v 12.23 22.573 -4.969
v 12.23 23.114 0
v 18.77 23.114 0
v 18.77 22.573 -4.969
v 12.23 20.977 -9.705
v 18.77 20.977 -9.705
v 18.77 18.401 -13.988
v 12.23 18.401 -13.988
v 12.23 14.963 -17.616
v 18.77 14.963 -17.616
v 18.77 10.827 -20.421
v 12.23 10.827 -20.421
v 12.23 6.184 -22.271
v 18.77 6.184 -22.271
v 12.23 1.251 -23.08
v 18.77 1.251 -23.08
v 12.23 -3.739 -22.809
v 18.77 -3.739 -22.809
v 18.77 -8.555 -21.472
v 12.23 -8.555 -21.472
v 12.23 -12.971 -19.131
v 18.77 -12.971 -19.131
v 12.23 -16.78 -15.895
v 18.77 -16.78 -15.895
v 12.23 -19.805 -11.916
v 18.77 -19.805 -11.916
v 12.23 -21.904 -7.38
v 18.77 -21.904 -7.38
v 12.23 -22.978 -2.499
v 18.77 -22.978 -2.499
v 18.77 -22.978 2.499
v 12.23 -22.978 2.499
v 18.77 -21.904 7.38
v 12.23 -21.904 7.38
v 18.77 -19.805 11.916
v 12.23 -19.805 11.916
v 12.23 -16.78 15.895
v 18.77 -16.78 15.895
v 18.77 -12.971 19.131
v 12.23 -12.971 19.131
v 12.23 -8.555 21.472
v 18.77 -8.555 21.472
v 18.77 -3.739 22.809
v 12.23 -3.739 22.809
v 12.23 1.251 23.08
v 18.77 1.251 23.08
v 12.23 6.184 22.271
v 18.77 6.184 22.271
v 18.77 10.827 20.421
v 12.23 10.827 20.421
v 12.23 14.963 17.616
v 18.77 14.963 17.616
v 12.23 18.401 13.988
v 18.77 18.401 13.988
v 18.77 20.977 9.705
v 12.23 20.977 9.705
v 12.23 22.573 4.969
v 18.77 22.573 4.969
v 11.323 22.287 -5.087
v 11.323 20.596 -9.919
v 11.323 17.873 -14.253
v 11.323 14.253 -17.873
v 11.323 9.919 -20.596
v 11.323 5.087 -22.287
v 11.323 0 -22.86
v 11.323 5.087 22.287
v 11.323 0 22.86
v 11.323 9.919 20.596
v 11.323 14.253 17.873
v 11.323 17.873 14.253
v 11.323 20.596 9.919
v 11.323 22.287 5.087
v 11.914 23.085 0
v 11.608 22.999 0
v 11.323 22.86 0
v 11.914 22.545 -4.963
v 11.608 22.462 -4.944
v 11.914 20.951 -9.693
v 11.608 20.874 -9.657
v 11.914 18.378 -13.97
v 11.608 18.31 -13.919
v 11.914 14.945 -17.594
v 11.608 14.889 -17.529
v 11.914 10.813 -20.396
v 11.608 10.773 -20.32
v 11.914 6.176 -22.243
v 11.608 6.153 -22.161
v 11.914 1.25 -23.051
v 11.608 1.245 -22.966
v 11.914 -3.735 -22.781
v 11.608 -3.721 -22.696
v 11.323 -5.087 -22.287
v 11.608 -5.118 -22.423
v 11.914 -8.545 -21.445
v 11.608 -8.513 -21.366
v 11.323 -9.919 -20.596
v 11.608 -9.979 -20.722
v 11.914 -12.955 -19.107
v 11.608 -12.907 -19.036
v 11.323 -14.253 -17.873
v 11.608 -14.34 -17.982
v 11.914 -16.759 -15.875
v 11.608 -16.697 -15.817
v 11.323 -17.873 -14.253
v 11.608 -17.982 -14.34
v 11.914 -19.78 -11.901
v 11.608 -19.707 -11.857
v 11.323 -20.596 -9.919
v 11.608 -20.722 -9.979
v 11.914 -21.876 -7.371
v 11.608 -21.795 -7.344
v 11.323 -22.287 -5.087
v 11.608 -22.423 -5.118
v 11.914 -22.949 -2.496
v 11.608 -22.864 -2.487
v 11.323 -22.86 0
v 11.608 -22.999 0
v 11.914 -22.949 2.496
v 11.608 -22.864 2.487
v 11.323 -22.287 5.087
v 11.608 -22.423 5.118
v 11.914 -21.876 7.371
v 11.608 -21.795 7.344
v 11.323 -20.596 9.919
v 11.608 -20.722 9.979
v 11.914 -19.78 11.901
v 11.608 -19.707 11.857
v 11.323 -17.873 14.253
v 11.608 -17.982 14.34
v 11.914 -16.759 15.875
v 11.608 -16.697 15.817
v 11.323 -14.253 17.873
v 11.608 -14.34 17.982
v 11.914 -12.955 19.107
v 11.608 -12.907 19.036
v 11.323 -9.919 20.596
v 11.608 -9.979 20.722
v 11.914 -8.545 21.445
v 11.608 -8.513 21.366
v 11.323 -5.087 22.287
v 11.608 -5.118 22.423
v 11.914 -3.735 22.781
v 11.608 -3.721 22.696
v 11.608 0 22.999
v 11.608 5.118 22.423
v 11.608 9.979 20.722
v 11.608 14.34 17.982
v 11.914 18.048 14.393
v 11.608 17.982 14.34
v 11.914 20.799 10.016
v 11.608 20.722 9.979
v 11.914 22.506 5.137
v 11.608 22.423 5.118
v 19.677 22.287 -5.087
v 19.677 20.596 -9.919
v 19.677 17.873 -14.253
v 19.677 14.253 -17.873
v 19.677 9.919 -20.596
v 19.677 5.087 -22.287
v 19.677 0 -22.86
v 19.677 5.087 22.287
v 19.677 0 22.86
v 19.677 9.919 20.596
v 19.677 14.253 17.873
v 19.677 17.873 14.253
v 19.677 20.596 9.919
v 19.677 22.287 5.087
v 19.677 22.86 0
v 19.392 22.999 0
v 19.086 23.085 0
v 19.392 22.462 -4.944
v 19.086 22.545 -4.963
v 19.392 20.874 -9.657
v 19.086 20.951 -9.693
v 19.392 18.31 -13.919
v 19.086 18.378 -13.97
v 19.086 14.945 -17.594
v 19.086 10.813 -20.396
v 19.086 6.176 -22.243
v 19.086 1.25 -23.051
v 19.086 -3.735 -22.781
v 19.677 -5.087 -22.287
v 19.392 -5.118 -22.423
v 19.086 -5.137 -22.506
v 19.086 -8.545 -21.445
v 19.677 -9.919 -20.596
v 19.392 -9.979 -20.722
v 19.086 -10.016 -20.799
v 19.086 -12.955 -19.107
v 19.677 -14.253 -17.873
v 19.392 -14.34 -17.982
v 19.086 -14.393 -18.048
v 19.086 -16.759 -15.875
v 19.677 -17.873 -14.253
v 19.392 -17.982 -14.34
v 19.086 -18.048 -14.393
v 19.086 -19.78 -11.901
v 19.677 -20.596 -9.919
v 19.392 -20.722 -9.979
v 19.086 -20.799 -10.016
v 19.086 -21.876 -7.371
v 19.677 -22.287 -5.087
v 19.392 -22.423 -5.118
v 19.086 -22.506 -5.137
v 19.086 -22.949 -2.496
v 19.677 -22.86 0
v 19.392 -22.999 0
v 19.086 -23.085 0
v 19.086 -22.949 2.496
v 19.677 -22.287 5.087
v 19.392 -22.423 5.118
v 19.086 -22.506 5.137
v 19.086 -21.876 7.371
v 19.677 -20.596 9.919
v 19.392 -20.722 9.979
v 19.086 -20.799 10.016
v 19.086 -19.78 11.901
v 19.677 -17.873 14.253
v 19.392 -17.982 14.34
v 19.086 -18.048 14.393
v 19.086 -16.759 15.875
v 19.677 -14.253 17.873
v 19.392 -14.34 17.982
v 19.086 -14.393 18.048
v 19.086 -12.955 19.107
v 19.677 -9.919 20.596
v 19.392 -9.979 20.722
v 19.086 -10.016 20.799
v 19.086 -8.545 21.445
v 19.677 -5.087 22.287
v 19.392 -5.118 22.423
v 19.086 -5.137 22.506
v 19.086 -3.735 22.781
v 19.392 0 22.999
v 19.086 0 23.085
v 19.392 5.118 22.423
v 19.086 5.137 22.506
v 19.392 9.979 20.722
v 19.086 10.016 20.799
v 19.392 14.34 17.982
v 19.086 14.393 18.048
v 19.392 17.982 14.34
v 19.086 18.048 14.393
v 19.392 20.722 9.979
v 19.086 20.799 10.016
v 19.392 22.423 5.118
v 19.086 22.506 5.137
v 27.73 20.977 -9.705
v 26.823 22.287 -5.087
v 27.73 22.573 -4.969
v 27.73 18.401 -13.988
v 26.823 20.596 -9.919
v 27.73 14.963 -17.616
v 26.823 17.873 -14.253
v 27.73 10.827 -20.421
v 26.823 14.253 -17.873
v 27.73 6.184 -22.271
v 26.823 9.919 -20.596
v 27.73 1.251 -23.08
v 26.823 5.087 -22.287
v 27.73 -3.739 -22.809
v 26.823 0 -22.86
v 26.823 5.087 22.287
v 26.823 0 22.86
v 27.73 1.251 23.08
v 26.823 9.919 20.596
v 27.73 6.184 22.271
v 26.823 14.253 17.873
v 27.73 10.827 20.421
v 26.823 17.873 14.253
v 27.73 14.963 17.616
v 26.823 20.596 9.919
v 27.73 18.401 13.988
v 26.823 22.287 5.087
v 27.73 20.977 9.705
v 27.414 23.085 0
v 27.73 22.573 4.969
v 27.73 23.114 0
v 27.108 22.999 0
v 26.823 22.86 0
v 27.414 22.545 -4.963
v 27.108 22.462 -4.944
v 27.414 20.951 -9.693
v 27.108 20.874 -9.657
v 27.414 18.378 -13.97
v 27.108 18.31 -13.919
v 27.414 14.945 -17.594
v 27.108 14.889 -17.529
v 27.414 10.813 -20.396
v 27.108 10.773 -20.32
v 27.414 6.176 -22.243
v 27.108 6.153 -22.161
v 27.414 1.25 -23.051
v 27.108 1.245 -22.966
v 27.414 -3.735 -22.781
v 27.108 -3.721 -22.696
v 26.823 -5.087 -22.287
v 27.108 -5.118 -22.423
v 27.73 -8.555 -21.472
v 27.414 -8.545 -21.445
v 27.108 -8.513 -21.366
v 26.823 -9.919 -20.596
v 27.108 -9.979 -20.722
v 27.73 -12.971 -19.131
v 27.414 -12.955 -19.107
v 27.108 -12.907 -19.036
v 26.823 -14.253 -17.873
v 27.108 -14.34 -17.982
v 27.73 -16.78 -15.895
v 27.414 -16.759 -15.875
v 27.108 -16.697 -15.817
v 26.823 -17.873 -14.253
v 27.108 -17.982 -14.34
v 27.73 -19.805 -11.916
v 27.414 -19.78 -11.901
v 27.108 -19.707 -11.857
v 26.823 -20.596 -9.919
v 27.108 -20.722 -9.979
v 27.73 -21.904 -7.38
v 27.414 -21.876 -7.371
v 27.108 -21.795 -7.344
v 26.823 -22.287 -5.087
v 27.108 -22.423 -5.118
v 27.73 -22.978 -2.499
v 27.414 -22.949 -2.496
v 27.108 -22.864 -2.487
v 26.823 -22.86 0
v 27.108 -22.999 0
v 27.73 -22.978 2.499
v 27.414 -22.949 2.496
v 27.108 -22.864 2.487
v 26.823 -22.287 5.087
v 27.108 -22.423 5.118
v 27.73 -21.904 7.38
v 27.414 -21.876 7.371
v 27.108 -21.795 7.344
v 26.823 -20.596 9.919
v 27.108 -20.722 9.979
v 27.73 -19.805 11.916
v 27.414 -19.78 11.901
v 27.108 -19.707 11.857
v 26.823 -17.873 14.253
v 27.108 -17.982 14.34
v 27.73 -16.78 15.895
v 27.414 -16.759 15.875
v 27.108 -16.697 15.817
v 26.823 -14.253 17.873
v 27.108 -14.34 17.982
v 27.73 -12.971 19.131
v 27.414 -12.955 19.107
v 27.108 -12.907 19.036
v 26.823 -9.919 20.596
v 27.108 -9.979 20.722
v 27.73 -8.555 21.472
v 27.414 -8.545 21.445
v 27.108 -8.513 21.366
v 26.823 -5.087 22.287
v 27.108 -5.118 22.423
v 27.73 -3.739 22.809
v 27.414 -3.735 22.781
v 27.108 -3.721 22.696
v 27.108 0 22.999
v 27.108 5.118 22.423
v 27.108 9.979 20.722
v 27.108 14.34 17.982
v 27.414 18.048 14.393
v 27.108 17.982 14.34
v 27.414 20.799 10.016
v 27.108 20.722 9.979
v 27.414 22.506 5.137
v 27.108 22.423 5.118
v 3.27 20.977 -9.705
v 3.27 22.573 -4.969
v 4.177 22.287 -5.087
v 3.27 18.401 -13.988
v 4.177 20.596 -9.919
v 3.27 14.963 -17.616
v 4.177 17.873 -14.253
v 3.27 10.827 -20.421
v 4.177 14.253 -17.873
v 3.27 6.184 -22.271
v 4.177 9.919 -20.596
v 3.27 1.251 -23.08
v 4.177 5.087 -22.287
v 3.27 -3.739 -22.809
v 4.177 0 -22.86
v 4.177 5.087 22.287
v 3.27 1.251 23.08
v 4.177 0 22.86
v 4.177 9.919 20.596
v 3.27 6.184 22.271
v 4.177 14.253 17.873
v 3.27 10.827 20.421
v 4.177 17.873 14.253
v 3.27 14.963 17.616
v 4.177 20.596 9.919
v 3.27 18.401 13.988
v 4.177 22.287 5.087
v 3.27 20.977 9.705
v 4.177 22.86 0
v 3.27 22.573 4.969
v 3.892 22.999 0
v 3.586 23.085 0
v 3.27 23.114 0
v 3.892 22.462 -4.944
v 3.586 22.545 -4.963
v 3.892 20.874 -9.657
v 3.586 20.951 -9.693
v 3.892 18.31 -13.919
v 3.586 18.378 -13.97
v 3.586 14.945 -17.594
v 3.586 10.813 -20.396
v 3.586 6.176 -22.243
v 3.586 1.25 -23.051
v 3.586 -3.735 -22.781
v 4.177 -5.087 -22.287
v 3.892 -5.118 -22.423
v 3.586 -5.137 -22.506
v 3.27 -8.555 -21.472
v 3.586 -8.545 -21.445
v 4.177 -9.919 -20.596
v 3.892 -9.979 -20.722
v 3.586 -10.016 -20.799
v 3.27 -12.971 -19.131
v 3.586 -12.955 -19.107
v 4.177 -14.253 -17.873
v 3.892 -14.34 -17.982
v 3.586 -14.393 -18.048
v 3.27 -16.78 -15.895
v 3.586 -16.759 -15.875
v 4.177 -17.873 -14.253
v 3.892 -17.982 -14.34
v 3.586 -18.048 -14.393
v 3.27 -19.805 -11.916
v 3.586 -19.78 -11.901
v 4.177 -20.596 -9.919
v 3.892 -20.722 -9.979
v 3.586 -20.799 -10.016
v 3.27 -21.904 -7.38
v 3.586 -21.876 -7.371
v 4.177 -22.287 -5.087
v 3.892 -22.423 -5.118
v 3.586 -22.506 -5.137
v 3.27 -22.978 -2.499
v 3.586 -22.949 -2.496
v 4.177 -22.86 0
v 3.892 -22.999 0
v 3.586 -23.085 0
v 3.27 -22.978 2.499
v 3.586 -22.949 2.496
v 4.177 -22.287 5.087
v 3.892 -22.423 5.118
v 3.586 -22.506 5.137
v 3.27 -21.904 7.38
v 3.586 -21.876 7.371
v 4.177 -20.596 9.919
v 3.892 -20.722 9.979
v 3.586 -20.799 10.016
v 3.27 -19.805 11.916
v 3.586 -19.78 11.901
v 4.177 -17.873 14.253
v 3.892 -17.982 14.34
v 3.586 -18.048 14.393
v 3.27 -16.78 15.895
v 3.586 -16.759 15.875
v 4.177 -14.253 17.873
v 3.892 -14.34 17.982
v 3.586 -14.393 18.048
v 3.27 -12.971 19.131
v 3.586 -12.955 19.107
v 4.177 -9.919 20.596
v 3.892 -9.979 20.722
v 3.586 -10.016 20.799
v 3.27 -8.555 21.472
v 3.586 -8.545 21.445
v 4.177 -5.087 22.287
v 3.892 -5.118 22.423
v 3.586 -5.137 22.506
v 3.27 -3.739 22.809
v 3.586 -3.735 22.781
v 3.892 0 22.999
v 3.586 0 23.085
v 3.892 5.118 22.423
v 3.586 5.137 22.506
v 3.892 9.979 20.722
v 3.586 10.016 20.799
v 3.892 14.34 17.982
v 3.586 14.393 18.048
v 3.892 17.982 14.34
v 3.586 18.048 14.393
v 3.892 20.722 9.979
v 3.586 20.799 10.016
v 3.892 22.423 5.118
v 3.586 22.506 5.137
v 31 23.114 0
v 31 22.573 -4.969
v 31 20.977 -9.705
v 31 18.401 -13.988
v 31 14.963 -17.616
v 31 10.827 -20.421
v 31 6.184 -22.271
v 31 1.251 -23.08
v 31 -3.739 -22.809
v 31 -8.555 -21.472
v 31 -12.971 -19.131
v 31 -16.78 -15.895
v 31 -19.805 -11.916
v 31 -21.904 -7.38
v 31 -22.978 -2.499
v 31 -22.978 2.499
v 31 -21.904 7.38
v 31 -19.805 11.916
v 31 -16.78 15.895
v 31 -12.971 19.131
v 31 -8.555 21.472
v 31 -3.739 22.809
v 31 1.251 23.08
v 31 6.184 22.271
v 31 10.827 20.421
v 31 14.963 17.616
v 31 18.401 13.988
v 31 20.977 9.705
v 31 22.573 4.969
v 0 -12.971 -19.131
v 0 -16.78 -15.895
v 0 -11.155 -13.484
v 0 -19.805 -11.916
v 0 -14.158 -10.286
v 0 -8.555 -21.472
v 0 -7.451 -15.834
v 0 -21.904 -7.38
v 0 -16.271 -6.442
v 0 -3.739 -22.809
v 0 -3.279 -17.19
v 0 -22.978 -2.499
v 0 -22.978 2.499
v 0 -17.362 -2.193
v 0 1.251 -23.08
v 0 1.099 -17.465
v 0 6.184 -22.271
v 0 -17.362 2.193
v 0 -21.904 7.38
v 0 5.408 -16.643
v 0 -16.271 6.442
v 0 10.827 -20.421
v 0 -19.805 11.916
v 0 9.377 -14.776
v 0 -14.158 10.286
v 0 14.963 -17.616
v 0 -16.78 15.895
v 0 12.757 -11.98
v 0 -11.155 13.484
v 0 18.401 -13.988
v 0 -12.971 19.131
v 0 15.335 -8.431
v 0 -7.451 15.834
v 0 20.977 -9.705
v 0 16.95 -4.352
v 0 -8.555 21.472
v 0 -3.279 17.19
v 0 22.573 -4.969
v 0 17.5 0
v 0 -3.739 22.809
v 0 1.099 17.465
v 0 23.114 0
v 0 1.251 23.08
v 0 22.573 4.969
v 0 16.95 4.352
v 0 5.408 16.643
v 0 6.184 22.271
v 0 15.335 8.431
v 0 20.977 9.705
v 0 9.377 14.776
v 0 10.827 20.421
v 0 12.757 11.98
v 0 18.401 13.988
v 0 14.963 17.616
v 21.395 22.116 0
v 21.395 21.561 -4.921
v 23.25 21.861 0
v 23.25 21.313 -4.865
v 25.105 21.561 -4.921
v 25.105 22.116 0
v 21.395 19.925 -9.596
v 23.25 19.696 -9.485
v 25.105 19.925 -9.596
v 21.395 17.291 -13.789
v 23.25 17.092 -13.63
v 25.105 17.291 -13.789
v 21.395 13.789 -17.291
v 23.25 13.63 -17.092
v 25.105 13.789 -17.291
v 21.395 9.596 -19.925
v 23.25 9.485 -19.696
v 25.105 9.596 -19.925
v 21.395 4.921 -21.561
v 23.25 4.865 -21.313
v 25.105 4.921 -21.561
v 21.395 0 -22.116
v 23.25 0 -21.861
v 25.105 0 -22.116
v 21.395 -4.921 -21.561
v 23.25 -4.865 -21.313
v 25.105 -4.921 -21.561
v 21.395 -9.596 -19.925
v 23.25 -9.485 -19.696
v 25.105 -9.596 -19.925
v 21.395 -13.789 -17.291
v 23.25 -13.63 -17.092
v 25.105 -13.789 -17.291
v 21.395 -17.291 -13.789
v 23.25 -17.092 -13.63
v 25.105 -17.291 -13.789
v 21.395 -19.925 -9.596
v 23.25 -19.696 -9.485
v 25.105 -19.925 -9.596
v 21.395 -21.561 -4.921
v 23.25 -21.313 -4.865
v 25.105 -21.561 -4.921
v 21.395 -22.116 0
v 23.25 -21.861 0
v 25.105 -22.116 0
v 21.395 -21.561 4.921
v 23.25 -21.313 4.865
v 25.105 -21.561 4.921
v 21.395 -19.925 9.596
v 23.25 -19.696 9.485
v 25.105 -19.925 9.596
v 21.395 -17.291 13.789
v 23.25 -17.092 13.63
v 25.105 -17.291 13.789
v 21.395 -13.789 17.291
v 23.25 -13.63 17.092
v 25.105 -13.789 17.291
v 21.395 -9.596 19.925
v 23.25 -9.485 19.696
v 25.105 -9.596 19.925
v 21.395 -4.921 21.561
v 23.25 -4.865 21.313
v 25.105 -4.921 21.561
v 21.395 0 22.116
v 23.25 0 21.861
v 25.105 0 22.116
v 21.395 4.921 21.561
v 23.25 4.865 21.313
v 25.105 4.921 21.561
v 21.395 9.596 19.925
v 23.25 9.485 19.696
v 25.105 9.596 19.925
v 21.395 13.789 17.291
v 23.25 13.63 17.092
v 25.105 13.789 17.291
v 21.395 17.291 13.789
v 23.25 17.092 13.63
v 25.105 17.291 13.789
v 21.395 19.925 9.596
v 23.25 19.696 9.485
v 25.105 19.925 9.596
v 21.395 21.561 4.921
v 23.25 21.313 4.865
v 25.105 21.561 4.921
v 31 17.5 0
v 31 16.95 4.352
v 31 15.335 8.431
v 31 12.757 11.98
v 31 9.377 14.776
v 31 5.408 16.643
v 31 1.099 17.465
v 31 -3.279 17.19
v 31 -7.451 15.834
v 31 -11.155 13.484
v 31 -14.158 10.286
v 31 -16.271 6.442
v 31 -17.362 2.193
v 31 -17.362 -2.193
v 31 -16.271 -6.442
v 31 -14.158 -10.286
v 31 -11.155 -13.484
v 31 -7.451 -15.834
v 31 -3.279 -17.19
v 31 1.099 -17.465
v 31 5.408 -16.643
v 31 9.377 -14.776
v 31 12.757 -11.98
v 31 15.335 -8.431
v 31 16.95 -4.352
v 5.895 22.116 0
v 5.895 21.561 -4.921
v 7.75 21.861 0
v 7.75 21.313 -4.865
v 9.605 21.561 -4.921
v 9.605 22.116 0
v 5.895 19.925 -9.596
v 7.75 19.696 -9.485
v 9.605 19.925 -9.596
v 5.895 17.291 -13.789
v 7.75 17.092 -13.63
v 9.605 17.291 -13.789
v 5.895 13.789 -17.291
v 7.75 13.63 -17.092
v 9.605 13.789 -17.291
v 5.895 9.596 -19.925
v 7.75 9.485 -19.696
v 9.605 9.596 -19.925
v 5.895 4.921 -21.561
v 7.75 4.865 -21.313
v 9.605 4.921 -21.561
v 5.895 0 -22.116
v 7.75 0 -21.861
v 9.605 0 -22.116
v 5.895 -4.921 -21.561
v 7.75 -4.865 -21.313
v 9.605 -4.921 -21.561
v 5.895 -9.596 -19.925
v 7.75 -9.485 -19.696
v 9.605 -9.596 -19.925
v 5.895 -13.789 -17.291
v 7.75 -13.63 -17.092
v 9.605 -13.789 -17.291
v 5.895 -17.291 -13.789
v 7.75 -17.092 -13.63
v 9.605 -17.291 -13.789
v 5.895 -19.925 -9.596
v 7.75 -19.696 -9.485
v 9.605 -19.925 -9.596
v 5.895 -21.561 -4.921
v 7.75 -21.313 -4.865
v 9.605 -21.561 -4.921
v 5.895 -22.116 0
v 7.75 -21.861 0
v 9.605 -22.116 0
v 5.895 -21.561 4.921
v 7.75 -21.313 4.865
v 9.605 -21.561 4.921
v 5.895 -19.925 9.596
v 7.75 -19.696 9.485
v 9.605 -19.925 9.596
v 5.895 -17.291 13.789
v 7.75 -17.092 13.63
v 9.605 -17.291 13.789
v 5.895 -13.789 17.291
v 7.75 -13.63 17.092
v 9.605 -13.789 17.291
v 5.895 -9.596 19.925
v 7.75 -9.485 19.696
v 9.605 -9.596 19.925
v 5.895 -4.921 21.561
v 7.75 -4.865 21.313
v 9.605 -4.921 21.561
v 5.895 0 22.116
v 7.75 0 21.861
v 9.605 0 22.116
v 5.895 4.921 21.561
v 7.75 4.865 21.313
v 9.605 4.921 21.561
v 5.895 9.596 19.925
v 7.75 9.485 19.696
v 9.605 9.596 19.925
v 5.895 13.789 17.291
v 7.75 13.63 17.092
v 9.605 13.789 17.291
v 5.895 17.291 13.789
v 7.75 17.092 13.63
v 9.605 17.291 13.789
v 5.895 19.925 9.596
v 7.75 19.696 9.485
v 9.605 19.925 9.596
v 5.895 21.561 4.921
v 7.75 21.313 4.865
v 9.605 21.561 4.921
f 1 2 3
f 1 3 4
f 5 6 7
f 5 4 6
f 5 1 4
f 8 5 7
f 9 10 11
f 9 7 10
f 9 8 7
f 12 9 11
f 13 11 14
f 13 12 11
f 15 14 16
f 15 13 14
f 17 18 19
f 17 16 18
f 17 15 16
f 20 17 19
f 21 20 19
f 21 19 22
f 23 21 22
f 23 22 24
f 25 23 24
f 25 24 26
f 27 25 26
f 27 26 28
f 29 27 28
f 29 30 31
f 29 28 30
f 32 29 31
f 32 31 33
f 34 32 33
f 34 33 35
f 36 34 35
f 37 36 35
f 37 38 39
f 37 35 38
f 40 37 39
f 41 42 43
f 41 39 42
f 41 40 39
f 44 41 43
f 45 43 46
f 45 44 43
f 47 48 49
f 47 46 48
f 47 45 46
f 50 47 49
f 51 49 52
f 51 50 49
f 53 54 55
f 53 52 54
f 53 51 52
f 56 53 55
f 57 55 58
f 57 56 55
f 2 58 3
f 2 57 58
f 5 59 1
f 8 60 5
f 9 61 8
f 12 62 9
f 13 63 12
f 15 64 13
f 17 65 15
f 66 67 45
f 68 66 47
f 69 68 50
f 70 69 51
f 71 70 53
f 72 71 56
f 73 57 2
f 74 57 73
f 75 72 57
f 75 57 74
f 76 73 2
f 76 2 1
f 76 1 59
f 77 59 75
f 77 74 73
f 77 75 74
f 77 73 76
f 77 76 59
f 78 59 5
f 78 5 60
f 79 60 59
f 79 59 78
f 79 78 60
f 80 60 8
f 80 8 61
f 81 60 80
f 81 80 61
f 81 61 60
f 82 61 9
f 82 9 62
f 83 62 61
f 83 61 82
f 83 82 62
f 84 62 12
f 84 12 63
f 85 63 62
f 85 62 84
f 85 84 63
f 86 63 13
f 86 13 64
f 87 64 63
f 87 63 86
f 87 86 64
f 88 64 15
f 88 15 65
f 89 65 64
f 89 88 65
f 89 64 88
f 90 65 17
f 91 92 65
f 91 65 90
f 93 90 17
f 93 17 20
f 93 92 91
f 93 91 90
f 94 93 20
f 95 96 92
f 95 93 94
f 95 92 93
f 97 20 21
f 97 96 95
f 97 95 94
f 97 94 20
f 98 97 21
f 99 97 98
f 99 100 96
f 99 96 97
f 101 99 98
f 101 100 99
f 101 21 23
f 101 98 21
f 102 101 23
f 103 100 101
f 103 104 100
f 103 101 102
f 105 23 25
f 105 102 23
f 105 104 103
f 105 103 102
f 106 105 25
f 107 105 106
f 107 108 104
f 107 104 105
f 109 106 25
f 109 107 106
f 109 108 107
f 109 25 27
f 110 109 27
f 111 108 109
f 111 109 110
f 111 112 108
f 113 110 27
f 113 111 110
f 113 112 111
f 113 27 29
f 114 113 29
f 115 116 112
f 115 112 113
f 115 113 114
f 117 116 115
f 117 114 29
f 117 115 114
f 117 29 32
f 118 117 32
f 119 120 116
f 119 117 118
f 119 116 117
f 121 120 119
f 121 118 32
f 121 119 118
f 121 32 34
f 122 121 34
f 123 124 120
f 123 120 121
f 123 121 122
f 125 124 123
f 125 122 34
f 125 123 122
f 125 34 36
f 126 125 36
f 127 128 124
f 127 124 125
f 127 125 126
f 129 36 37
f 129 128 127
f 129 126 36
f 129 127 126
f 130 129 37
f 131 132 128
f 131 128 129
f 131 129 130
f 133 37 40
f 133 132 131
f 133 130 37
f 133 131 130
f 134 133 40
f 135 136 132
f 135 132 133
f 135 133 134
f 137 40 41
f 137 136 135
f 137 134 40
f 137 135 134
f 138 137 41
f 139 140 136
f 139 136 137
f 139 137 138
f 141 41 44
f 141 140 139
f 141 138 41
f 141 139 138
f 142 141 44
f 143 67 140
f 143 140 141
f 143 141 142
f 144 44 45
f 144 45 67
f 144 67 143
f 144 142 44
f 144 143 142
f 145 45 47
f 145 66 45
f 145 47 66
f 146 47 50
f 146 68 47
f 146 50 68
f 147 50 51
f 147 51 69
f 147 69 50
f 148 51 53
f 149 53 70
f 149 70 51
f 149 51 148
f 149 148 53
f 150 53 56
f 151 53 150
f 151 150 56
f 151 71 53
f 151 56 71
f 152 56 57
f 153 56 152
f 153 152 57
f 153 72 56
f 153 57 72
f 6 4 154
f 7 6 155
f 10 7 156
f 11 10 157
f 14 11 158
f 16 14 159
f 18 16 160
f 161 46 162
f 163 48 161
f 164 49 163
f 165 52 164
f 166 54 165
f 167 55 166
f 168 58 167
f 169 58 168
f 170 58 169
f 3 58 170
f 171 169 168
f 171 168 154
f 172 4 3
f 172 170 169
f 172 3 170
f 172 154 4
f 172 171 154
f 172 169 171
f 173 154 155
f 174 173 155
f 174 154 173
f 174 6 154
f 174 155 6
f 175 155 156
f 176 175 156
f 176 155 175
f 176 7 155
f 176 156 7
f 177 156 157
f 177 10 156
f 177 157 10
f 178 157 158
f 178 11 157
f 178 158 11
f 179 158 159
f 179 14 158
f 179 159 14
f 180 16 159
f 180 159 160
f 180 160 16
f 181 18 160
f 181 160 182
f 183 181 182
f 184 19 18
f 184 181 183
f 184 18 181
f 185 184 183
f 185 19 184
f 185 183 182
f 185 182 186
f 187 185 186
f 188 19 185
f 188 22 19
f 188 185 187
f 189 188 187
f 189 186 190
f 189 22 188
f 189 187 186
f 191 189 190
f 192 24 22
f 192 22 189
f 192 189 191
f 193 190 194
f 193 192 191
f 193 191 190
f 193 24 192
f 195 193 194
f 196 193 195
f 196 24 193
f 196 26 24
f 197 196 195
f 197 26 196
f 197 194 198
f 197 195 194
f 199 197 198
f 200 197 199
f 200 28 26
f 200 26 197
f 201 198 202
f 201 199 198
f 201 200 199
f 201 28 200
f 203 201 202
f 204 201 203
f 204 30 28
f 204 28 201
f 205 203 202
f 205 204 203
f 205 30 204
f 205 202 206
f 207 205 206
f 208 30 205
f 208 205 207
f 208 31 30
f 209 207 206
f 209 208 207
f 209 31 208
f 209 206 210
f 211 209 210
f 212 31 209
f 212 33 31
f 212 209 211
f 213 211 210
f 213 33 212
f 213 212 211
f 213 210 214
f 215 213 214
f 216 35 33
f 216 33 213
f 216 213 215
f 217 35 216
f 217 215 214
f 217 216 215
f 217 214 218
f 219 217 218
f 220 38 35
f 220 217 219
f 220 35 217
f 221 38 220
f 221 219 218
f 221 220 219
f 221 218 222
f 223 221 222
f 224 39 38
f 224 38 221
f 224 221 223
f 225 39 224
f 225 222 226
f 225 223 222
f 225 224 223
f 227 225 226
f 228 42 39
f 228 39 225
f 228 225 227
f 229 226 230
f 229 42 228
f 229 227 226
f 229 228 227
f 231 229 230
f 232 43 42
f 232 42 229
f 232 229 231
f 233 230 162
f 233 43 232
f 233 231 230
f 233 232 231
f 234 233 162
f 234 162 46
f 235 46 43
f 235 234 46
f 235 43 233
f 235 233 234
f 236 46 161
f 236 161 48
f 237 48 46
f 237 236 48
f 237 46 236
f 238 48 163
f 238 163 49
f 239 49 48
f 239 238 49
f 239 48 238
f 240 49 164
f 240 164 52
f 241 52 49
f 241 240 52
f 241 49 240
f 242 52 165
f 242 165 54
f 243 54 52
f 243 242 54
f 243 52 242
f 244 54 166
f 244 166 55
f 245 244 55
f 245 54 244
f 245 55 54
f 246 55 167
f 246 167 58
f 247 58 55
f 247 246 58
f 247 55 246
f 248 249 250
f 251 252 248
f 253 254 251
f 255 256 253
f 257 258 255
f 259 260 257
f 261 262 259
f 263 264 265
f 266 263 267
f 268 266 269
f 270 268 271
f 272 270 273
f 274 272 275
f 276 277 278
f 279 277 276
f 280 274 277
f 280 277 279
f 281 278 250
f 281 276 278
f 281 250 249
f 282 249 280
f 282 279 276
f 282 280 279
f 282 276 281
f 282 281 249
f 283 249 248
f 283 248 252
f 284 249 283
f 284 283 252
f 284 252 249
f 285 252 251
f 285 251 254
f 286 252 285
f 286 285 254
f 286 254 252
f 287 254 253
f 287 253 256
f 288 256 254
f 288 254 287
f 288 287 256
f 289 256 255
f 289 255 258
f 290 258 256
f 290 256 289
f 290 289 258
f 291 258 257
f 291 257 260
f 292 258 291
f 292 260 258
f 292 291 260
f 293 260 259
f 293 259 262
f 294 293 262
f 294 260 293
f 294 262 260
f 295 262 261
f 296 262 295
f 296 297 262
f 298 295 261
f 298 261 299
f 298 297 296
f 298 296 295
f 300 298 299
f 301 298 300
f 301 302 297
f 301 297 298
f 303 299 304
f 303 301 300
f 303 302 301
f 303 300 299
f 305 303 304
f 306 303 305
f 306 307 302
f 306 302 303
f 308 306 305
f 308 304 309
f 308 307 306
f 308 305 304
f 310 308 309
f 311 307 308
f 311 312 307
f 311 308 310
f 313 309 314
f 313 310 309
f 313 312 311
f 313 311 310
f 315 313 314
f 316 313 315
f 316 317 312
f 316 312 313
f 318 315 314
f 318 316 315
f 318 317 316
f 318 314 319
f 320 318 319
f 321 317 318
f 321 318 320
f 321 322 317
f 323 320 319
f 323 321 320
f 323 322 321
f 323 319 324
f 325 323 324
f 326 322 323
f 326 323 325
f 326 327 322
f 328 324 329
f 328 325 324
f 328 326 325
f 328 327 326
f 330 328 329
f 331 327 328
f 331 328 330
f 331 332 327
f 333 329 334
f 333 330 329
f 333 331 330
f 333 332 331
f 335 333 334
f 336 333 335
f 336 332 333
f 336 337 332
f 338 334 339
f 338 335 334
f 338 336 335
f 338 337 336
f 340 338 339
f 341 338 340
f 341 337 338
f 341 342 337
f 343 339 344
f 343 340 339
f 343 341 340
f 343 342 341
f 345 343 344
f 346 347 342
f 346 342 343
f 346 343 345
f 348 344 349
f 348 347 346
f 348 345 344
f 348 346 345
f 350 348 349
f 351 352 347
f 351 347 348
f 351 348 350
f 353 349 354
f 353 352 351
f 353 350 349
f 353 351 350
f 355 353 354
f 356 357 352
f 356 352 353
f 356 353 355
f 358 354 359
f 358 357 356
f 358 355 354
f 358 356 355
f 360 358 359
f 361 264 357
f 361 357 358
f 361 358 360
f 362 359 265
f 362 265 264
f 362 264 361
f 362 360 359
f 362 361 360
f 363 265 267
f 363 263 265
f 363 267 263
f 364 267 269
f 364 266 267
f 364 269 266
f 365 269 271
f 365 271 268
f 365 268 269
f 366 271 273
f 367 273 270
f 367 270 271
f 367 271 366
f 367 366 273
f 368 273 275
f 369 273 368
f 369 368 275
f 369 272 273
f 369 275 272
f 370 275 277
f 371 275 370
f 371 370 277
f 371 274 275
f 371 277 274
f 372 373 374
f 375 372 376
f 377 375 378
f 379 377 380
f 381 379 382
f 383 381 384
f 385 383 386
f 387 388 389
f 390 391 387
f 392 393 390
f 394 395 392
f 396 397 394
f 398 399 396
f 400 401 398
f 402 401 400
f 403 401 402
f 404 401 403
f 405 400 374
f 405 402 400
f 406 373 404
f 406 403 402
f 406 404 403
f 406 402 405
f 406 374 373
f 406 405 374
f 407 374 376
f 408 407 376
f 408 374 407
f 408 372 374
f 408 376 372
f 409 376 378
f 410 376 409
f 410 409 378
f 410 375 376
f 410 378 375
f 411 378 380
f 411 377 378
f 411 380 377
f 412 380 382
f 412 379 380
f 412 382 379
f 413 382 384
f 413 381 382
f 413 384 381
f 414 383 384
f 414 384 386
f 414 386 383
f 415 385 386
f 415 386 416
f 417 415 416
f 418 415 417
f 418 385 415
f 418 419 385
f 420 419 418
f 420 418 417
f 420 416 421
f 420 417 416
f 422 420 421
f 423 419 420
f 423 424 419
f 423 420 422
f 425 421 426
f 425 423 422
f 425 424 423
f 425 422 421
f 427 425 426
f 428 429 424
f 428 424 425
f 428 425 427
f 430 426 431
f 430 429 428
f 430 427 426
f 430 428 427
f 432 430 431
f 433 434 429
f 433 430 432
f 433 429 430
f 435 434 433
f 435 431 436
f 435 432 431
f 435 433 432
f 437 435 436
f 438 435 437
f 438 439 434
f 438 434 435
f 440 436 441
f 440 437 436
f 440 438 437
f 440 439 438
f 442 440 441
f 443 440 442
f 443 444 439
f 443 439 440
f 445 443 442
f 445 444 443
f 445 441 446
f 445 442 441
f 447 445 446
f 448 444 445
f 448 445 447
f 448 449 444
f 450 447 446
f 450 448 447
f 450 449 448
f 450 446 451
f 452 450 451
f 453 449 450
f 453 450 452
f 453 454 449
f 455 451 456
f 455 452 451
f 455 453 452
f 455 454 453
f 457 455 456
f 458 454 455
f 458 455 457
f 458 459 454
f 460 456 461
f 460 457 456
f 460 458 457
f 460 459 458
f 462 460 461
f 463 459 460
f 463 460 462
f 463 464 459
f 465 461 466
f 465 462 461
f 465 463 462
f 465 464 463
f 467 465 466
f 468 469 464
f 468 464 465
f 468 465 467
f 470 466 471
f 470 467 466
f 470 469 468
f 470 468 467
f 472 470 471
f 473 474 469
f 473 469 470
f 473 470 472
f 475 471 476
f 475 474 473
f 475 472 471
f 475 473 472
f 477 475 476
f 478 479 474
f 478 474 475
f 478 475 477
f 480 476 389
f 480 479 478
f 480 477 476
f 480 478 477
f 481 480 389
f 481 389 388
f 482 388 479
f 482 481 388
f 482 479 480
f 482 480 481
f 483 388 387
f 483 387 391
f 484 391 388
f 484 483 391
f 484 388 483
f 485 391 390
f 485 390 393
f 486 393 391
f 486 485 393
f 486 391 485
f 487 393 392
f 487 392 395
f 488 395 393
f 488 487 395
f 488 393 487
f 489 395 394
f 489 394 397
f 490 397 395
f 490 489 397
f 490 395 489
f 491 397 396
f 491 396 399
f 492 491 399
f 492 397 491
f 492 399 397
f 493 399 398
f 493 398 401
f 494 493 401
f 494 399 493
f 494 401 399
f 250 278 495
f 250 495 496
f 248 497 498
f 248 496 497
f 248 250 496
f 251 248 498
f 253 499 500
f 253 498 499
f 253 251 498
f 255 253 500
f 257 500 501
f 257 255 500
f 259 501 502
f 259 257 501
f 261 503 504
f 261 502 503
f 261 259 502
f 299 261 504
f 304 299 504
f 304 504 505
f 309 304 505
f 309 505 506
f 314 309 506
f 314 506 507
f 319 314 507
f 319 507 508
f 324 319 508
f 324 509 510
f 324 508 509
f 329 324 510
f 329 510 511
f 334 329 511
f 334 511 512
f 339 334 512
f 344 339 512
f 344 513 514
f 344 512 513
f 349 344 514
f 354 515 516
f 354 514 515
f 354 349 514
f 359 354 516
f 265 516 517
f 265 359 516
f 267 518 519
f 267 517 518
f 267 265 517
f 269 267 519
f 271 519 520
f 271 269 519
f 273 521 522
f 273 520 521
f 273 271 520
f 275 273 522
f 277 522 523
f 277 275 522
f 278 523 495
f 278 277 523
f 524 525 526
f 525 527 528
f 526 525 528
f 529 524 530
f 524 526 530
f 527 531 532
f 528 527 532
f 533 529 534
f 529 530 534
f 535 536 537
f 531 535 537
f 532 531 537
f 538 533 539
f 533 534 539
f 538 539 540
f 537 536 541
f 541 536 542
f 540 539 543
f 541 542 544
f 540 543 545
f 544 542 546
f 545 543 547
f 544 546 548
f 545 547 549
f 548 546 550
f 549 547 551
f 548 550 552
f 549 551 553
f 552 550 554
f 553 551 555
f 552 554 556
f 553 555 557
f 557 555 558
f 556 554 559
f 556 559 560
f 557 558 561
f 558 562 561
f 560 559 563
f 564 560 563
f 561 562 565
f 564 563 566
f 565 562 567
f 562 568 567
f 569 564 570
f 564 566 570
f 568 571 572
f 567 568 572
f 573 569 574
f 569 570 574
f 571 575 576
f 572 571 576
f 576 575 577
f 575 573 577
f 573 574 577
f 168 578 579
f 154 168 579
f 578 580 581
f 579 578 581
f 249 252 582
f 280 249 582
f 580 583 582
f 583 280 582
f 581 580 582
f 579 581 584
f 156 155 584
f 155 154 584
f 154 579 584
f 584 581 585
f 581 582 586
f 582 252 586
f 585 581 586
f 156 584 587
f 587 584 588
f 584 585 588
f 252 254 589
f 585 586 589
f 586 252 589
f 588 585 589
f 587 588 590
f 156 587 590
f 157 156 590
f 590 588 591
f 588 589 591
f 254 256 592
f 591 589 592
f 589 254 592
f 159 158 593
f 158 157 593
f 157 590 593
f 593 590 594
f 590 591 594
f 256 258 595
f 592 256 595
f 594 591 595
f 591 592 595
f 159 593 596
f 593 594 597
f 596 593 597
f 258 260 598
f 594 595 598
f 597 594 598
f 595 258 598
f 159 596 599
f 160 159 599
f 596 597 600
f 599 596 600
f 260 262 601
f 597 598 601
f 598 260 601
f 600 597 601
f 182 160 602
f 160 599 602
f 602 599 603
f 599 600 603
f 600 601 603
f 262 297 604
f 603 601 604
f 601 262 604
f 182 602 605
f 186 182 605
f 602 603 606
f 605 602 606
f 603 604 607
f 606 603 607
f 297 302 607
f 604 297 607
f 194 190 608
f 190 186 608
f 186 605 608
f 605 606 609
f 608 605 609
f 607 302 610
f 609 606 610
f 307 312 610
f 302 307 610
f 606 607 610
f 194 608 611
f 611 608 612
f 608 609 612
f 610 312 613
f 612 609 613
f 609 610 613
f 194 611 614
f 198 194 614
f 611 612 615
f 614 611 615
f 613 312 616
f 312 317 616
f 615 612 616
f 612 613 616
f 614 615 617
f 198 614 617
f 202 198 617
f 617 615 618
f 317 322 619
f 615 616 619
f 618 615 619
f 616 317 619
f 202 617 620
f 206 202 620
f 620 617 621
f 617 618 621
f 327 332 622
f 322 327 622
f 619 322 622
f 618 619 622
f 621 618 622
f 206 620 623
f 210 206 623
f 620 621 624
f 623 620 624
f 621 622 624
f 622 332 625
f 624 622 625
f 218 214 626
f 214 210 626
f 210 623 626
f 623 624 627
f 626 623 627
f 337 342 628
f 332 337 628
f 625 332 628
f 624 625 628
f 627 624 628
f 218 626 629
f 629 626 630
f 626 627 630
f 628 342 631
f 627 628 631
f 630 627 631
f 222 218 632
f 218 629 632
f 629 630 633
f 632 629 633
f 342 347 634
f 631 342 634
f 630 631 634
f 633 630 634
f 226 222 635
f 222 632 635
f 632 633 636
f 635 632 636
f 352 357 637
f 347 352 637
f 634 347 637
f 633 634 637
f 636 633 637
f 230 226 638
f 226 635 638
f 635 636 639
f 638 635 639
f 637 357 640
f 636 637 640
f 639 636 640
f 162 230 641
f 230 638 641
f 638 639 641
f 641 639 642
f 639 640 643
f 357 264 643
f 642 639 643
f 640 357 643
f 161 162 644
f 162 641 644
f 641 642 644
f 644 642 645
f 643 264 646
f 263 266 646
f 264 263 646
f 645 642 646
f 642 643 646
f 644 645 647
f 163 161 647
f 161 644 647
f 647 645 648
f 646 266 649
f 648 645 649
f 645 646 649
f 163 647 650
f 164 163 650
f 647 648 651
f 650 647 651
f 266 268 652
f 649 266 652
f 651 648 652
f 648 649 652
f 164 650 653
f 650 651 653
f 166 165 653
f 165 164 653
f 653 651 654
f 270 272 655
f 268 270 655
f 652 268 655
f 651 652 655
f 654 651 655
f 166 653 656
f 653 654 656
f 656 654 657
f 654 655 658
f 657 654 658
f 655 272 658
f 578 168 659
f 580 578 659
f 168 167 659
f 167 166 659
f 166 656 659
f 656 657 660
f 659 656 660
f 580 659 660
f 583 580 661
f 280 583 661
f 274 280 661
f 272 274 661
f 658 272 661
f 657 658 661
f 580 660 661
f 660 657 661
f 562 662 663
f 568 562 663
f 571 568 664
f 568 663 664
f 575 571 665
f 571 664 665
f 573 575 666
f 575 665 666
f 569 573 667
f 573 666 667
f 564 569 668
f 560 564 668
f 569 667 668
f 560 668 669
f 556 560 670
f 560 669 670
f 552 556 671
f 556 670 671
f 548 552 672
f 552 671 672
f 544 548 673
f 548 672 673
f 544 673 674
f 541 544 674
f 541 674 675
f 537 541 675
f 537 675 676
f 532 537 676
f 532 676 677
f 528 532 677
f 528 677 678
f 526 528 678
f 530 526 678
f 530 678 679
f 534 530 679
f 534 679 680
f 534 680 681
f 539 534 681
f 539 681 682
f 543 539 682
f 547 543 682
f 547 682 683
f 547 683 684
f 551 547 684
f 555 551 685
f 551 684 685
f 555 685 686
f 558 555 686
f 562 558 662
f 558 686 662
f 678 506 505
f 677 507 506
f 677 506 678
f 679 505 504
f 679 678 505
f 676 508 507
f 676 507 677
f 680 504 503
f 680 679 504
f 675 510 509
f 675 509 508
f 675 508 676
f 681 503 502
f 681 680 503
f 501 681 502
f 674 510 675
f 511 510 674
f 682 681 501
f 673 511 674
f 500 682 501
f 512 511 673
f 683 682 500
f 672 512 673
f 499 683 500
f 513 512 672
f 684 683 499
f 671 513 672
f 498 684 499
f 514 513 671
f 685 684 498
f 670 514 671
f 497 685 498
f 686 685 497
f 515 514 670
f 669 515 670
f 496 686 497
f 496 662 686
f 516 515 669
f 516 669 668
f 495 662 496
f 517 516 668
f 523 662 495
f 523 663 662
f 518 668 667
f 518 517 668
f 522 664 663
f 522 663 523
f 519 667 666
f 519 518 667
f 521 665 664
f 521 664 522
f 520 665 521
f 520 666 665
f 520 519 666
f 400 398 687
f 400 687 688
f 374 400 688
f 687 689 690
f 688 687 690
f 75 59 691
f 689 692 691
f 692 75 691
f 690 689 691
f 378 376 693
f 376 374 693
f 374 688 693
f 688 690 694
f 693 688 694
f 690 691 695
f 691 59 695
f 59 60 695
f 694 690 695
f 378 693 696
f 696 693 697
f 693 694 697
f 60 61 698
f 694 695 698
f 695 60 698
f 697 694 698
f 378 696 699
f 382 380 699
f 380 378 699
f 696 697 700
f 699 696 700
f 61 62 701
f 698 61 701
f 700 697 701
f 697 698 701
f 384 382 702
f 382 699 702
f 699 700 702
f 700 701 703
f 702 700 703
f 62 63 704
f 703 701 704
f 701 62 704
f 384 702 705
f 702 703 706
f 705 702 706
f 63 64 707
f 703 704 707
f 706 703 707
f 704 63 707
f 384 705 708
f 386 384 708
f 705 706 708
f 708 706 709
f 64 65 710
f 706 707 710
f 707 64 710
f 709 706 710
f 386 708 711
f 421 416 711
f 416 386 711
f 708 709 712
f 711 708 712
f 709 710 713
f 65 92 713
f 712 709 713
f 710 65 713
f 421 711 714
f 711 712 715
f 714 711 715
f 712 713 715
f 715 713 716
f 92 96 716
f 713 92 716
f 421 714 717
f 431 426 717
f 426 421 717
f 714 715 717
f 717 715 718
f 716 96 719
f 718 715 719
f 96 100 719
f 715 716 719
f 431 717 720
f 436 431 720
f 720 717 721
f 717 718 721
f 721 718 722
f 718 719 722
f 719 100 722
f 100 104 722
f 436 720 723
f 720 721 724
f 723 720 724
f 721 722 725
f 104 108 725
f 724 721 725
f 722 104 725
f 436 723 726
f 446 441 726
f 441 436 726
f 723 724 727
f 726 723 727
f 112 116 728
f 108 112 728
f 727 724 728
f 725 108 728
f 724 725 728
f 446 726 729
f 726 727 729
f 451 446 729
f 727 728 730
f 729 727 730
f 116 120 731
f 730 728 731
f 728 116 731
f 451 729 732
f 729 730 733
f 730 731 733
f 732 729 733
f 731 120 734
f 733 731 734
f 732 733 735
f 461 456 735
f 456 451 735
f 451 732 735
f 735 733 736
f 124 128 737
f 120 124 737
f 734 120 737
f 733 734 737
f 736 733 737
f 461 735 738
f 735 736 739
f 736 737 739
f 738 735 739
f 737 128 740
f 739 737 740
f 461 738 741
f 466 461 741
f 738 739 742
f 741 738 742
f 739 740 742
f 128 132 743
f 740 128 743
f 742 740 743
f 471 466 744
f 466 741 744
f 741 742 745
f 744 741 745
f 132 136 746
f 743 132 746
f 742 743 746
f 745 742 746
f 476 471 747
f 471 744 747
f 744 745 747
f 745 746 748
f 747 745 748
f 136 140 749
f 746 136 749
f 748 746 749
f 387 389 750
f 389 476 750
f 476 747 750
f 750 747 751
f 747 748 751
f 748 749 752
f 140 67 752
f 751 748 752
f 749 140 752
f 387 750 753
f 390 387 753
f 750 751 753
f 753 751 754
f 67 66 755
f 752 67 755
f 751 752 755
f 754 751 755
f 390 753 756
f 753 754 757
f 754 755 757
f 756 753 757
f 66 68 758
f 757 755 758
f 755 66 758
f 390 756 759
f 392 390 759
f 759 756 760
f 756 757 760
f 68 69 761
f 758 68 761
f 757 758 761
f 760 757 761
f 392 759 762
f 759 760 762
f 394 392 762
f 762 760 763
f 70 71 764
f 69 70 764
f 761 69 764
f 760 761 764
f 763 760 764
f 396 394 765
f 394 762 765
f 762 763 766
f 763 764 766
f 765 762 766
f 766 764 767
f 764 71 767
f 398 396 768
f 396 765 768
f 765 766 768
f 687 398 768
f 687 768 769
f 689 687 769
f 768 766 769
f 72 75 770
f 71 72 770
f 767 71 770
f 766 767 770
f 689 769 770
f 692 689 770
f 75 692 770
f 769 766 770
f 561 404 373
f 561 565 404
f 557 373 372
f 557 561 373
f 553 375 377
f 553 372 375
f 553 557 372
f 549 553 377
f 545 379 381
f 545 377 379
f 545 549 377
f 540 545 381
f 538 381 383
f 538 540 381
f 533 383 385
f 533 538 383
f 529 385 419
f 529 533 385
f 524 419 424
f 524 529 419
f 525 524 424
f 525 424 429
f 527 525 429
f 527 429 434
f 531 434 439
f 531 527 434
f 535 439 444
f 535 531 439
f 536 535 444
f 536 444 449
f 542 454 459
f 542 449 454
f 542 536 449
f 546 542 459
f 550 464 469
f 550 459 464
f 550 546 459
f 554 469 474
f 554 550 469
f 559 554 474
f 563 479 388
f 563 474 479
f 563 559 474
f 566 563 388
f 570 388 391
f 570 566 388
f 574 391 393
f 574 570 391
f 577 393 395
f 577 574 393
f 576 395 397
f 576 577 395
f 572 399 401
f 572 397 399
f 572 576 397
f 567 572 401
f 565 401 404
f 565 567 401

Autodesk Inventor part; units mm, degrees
sketch "Sketch_1" plane through (0, 0, 0) normal (0, 0, 1) x (1, 0, 0)
  line L0 (50, 0) -> (-50, 0)
  line L1 (0, 23.1136) -> (0, 17.5)
  line L2 (0, 17.5) -> (31, 17.5)
  line L3 (31, 17.5) -> (31, 23.1136)
  line L4 (31, 23.1136) -> (27.7302, 23.1136)
  arc A0 (27.7302, 23.1136) -> (26.8226, 22.8599) centre (27.7302, 21.3636) ccw
  arc A1 (19.6774, 22.8599) -> (26.8226, 22.8599) centre (23.25, 28.75) ccw
  arc A2 (19.6774, 22.8599) -> (18.7698, 23.1136) centre (18.7698, 21.3636) ccw
  line L5 (18.7698, 23.1136) -> (12.2302, 23.1136)
  arc A3 (12.2302, 23.1136) -> (11.3226, 22.8599) centre (12.2302, 21.3636) ccw
  arc A4 (4.1774, 22.8599) -> (11.3226, 22.8599) centre (7.75, 28.75) ccw
  arc A5 (4.1774, 22.8599) -> (3.2698, 23.1136) centre (3.2698, 21.3636) ccw
  line L6 (3.2698, 23.1136) -> (0, 23.1136)
revolve "Revolution1" add sketch "Sketch_1" angle 360 about axis through (50, 0, 0) along (1, 0, 0)
ref_plane "IP_2_XY" through (15.5, 0, 0) normal (1, 0, 0) x (0, 0, -1)
ref_plane "IP_2_YZ" through (15.5, 0, 0) normal (0, 0, -1) x (0, 1, 0)
ref_plane "IP_2_ZX" through (15.5, 0, 0) normal (0, 1, 0) x (1, 0, 0)
ref_plane "IP_3_1_XY" through (7.75, 28.75, 0) normal (1, 0, 0) x (0, 0, -1)
ref_plane "IP_3_1_YZ" through (7.75, 28.75, 0) normal (0, 0, -1) x (0, 1, 0)
ref_plane "IP_3_1_ZX" through (7.75, 28.75, 0) normal (0, 1, 0) x (1, 0, 0)
ref_plane "IP_3_10_XY" through (7.75, 23.2592, -16.8988) normal (1, 0, 0) x (0, 0, -1)
ref_plane "IP_3_10_YZ" through (7.75, 23.2592, -16.8988) normal (0, 0, -1) x (0, 1, 0)
ref_plane "IP_3_10_ZX" through (7.75, 23.2592, -16.8988) normal (0, 1, 0) x (1, 0, 0)
ref_plane "IP_3_2_XY" through (7.75, 23.2592, 16.8988) normal (1, 0, 0) x (0, 0, -1)
ref_plane "IP_3_2_YZ" through (7.75, 23.2592, 16.8988) normal (0, 0, -1) x (0, 1, 0)
ref_plane "IP_3_2_ZX" through (7.75, 23.2592, 16.8988) normal (0, 1, 0) x (1, 0, 0)
ref_plane "IP_3_3_XY" through (7.75, 8.8842, 27.3429) normal (1, 0, 0) x (0, 0, -1)
ref_plane "IP_3_3_YZ" through (7.75, 8.8842, 27.3429) normal (0, 0, -1) x (0, 1, 0)
ref_plane "IP_3_3_ZX" through (7.75, 8.8842, 27.3429) normal (0, 1, 0) x (1, 0, 0)
ref_plane "IP_3_4_XY" through (7.75, -8.8842, 27.3429) normal (1, 0, 0) x (0, 0, -1)
ref_plane "IP_3_4_YZ" through (7.75, -8.8842, 27.3429) normal (0, 0, -1) x (0, 1, 0)
ref_plane "IP_3_4_ZX" through (7.75, -8.8842, 27.3429) normal (0, 1, 0) x (1, 0, 0)
ref_plane "IP_3_5_XY" through (7.75, -23.2592, 16.8988) normal (1, 0, 0) x (0, 0, -1)
ref_plane "IP_3_5_YZ" through (7.75, -23.2592, 16.8988) normal (0, 0, -1) x (0, 1, 0)
ref_plane "IP_3_5_ZX" through (7.75, -23.2592, 16.8988) normal (0, 1, 0) x (1, 0, 0)
ref_plane "IP_3_6_XY" through (7.75, -28.75, 0) normal (1, 0, 0) x (0, 0, -1)
ref_plane "IP_3_6_YZ" through (7.75, -28.75, 0) normal (0, 0, -1) x (0, 1, 0)
ref_plane "IP_3_6_ZX" through (7.75, -28.75, 0) normal (0, 1, 0) x (1, 0, 0)
ref_plane "IP_3_7_XY" through (7.75, -23.2592, -16.8988) normal (1, 0, 0) x (0, 0, -1)
ref_plane "IP_3_7_YZ" through (7.75, -23.2592, -16.8988) normal (0, 0, -1) x (0, 1, 0)
ref_plane "IP_3_7_ZX" through (7.75, -23.2592, -16.8988) normal (0, 1, 0) x (1, 0, 0)
ref_plane "IP_3_8_XY" through (7.75, -8.8842, -27.3429) normal (1, 0, 0) x (0, 0, -1)
ref_plane "IP_3_8_YZ" through (7.75, -8.8842, -27.3429) normal (0, 0, -1) x (0, 1, 0)
ref_plane "IP_3_8_ZX" through (7.75, -8.8842, -27.3429) normal (0, 1, 0) x (1, 0, 0)
ref_plane "IP_3_9_XY" through (7.75, 8.8842, -27.3429) normal (1, 0, 0) x (0, 0, -1)
ref_plane "IP_3_9_YZ" through (7.75, 8.8842, -27.3429) normal (0, 0, -1) x (0, 1, 0)
ref_plane "IP_3_9_ZX" through (7.75, 8.8842, -27.3429) normal (0, 1, 0) x (1, 0, 0)
ref_plane "IP_4_1_XY" through (23.25, 27.3429, 8.8842) normal (1, 0, 0) x (0, 0, -1)
ref_plane "IP_4_1_YZ" through (23.25, 27.3429, 8.8842) normal (0, 0, -1) x (0, 1, 0)
ref_plane "IP_4_1_ZX" through (23.25, 27.3429, 8.8842) normal (0, 1, 0) x (1, 0, 0)
ref_plane "IP_4_10_XY" through (23.25, 27.3429, -8.8842) normal (1, 0, 0) x (0, 0, -1)
ref_plane "IP_4_10_YZ" through (23.25, 27.3429, -8.8842) normal (0, 0, -1) x (0, 1, 0)
ref_plane "IP_4_10_ZX" through (23.25, 27.3429, -8.8842) normal (0, 1, 0) x (1, 0, 0)
ref_plane "IP_4_2_XY" through (23.25, 16.8988, 23.2592) normal (1, 0, 0) x (0, 0, -1)
ref_plane "IP_4_2_YZ" through (23.25, 16.8988, 23.2592) normal (0, 0, -1) x (0, 1, 0)
ref_plane "IP_4_2_ZX" through (23.25, 16.8988, 23.2592) normal (0, 1, 0) x (1, 0, 0)
ref_plane "IP_4_3_XY" through (23.25, 0, 28.75) normal (1, 0, 0) x (0, 0, -1)
ref_plane "IP_4_3_YZ" through (23.25, 0, 28.75) normal (0, 0, -1) x (0, 1, 0)
ref_plane "IP_4_3_ZX" through (23.25, 0, 28.75) normal (0, 1, 0) x (1, 0, 0)
ref_plane "IP_4_4_XY" through (23.25, -16.8988, 23.2592) normal (1, 0, 0) x (0, 0, -1)
ref_plane "IP_4_4_YZ" through (23.25, -16.8988, 23.2592) normal (0, 0, -1) x (0, 1, 0)
ref_plane "IP_4_4_ZX" through (23.25, -16.8988, 23.2592) normal (0, 1, 0) x (1, 0, 0)
ref_plane "IP_4_5_XY" through (23.25, -27.3429, 8.8842) normal (1, 0, 0) x (0, 0, -1)
ref_plane "IP_4_5_YZ" through (23.25, -27.3429, 8.8842) normal (0, 0, -1) x (0, 1, 0)
ref_plane "IP_4_5_ZX" through (23.25, -27.3429, 8.8842) normal (0, 1, 0) x (1, 0, 0)
ref_plane "IP_4_6_XY" through (23.25, -27.3429, -8.8842) normal (1, 0, 0) x (0, 0, -1)
ref_plane "IP_4_6_YZ" through (23.25, -27.3429, -8.8842) normal (0, 0, -1) x (0, 1, 0)
ref_plane "IP_4_6_ZX" through (23.25, -27.3429, -8.8842) normal (0, 1, 0) x (1, 0, 0)
ref_plane "IP_4_7_XY" through (23.25, -16.8988, -23.2592) normal (1, 0, 0) x (0, 0, -1)
ref_plane "IP_4_7_YZ" through (23.25, -16.8988, -23.2592) normal (0, 0, -1) x (0, 1, 0)
ref_plane "IP_4_7_ZX" through (23.25, -16.8988, -23.2592) normal (0, 1, 0) x (1, 0, 0)
ref_plane "IP_4_8_XY" through (23.25, 0, -28.75) normal (1, 0, 0) x (0, 0, -1)
ref_plane "IP_4_8_YZ" through (23.25, 0, -28.75) normal (0, 0, -1) x (0, 1, 0)
ref_plane "IP_4_8_ZX" through (23.25, 0, -28.75) normal (0, 1, 0) x (1, 0, 0)
ref_plane "IP_4_9_XY" through (23.25, 16.8988, -23.2592) normal (1, 0, 0) x (0, 0, -1)
ref_plane "IP_4_9_YZ" through (23.25, 16.8988, -23.2592) normal (0, 0, -1) x (0, 1, 0)
ref_plane "IP_4_9_ZX" through (23.25, 16.8988, -23.2592) normal (0, 1, 0) x (1, 0, 0)
properties part number "hpc_Q2307-ACC_2"
